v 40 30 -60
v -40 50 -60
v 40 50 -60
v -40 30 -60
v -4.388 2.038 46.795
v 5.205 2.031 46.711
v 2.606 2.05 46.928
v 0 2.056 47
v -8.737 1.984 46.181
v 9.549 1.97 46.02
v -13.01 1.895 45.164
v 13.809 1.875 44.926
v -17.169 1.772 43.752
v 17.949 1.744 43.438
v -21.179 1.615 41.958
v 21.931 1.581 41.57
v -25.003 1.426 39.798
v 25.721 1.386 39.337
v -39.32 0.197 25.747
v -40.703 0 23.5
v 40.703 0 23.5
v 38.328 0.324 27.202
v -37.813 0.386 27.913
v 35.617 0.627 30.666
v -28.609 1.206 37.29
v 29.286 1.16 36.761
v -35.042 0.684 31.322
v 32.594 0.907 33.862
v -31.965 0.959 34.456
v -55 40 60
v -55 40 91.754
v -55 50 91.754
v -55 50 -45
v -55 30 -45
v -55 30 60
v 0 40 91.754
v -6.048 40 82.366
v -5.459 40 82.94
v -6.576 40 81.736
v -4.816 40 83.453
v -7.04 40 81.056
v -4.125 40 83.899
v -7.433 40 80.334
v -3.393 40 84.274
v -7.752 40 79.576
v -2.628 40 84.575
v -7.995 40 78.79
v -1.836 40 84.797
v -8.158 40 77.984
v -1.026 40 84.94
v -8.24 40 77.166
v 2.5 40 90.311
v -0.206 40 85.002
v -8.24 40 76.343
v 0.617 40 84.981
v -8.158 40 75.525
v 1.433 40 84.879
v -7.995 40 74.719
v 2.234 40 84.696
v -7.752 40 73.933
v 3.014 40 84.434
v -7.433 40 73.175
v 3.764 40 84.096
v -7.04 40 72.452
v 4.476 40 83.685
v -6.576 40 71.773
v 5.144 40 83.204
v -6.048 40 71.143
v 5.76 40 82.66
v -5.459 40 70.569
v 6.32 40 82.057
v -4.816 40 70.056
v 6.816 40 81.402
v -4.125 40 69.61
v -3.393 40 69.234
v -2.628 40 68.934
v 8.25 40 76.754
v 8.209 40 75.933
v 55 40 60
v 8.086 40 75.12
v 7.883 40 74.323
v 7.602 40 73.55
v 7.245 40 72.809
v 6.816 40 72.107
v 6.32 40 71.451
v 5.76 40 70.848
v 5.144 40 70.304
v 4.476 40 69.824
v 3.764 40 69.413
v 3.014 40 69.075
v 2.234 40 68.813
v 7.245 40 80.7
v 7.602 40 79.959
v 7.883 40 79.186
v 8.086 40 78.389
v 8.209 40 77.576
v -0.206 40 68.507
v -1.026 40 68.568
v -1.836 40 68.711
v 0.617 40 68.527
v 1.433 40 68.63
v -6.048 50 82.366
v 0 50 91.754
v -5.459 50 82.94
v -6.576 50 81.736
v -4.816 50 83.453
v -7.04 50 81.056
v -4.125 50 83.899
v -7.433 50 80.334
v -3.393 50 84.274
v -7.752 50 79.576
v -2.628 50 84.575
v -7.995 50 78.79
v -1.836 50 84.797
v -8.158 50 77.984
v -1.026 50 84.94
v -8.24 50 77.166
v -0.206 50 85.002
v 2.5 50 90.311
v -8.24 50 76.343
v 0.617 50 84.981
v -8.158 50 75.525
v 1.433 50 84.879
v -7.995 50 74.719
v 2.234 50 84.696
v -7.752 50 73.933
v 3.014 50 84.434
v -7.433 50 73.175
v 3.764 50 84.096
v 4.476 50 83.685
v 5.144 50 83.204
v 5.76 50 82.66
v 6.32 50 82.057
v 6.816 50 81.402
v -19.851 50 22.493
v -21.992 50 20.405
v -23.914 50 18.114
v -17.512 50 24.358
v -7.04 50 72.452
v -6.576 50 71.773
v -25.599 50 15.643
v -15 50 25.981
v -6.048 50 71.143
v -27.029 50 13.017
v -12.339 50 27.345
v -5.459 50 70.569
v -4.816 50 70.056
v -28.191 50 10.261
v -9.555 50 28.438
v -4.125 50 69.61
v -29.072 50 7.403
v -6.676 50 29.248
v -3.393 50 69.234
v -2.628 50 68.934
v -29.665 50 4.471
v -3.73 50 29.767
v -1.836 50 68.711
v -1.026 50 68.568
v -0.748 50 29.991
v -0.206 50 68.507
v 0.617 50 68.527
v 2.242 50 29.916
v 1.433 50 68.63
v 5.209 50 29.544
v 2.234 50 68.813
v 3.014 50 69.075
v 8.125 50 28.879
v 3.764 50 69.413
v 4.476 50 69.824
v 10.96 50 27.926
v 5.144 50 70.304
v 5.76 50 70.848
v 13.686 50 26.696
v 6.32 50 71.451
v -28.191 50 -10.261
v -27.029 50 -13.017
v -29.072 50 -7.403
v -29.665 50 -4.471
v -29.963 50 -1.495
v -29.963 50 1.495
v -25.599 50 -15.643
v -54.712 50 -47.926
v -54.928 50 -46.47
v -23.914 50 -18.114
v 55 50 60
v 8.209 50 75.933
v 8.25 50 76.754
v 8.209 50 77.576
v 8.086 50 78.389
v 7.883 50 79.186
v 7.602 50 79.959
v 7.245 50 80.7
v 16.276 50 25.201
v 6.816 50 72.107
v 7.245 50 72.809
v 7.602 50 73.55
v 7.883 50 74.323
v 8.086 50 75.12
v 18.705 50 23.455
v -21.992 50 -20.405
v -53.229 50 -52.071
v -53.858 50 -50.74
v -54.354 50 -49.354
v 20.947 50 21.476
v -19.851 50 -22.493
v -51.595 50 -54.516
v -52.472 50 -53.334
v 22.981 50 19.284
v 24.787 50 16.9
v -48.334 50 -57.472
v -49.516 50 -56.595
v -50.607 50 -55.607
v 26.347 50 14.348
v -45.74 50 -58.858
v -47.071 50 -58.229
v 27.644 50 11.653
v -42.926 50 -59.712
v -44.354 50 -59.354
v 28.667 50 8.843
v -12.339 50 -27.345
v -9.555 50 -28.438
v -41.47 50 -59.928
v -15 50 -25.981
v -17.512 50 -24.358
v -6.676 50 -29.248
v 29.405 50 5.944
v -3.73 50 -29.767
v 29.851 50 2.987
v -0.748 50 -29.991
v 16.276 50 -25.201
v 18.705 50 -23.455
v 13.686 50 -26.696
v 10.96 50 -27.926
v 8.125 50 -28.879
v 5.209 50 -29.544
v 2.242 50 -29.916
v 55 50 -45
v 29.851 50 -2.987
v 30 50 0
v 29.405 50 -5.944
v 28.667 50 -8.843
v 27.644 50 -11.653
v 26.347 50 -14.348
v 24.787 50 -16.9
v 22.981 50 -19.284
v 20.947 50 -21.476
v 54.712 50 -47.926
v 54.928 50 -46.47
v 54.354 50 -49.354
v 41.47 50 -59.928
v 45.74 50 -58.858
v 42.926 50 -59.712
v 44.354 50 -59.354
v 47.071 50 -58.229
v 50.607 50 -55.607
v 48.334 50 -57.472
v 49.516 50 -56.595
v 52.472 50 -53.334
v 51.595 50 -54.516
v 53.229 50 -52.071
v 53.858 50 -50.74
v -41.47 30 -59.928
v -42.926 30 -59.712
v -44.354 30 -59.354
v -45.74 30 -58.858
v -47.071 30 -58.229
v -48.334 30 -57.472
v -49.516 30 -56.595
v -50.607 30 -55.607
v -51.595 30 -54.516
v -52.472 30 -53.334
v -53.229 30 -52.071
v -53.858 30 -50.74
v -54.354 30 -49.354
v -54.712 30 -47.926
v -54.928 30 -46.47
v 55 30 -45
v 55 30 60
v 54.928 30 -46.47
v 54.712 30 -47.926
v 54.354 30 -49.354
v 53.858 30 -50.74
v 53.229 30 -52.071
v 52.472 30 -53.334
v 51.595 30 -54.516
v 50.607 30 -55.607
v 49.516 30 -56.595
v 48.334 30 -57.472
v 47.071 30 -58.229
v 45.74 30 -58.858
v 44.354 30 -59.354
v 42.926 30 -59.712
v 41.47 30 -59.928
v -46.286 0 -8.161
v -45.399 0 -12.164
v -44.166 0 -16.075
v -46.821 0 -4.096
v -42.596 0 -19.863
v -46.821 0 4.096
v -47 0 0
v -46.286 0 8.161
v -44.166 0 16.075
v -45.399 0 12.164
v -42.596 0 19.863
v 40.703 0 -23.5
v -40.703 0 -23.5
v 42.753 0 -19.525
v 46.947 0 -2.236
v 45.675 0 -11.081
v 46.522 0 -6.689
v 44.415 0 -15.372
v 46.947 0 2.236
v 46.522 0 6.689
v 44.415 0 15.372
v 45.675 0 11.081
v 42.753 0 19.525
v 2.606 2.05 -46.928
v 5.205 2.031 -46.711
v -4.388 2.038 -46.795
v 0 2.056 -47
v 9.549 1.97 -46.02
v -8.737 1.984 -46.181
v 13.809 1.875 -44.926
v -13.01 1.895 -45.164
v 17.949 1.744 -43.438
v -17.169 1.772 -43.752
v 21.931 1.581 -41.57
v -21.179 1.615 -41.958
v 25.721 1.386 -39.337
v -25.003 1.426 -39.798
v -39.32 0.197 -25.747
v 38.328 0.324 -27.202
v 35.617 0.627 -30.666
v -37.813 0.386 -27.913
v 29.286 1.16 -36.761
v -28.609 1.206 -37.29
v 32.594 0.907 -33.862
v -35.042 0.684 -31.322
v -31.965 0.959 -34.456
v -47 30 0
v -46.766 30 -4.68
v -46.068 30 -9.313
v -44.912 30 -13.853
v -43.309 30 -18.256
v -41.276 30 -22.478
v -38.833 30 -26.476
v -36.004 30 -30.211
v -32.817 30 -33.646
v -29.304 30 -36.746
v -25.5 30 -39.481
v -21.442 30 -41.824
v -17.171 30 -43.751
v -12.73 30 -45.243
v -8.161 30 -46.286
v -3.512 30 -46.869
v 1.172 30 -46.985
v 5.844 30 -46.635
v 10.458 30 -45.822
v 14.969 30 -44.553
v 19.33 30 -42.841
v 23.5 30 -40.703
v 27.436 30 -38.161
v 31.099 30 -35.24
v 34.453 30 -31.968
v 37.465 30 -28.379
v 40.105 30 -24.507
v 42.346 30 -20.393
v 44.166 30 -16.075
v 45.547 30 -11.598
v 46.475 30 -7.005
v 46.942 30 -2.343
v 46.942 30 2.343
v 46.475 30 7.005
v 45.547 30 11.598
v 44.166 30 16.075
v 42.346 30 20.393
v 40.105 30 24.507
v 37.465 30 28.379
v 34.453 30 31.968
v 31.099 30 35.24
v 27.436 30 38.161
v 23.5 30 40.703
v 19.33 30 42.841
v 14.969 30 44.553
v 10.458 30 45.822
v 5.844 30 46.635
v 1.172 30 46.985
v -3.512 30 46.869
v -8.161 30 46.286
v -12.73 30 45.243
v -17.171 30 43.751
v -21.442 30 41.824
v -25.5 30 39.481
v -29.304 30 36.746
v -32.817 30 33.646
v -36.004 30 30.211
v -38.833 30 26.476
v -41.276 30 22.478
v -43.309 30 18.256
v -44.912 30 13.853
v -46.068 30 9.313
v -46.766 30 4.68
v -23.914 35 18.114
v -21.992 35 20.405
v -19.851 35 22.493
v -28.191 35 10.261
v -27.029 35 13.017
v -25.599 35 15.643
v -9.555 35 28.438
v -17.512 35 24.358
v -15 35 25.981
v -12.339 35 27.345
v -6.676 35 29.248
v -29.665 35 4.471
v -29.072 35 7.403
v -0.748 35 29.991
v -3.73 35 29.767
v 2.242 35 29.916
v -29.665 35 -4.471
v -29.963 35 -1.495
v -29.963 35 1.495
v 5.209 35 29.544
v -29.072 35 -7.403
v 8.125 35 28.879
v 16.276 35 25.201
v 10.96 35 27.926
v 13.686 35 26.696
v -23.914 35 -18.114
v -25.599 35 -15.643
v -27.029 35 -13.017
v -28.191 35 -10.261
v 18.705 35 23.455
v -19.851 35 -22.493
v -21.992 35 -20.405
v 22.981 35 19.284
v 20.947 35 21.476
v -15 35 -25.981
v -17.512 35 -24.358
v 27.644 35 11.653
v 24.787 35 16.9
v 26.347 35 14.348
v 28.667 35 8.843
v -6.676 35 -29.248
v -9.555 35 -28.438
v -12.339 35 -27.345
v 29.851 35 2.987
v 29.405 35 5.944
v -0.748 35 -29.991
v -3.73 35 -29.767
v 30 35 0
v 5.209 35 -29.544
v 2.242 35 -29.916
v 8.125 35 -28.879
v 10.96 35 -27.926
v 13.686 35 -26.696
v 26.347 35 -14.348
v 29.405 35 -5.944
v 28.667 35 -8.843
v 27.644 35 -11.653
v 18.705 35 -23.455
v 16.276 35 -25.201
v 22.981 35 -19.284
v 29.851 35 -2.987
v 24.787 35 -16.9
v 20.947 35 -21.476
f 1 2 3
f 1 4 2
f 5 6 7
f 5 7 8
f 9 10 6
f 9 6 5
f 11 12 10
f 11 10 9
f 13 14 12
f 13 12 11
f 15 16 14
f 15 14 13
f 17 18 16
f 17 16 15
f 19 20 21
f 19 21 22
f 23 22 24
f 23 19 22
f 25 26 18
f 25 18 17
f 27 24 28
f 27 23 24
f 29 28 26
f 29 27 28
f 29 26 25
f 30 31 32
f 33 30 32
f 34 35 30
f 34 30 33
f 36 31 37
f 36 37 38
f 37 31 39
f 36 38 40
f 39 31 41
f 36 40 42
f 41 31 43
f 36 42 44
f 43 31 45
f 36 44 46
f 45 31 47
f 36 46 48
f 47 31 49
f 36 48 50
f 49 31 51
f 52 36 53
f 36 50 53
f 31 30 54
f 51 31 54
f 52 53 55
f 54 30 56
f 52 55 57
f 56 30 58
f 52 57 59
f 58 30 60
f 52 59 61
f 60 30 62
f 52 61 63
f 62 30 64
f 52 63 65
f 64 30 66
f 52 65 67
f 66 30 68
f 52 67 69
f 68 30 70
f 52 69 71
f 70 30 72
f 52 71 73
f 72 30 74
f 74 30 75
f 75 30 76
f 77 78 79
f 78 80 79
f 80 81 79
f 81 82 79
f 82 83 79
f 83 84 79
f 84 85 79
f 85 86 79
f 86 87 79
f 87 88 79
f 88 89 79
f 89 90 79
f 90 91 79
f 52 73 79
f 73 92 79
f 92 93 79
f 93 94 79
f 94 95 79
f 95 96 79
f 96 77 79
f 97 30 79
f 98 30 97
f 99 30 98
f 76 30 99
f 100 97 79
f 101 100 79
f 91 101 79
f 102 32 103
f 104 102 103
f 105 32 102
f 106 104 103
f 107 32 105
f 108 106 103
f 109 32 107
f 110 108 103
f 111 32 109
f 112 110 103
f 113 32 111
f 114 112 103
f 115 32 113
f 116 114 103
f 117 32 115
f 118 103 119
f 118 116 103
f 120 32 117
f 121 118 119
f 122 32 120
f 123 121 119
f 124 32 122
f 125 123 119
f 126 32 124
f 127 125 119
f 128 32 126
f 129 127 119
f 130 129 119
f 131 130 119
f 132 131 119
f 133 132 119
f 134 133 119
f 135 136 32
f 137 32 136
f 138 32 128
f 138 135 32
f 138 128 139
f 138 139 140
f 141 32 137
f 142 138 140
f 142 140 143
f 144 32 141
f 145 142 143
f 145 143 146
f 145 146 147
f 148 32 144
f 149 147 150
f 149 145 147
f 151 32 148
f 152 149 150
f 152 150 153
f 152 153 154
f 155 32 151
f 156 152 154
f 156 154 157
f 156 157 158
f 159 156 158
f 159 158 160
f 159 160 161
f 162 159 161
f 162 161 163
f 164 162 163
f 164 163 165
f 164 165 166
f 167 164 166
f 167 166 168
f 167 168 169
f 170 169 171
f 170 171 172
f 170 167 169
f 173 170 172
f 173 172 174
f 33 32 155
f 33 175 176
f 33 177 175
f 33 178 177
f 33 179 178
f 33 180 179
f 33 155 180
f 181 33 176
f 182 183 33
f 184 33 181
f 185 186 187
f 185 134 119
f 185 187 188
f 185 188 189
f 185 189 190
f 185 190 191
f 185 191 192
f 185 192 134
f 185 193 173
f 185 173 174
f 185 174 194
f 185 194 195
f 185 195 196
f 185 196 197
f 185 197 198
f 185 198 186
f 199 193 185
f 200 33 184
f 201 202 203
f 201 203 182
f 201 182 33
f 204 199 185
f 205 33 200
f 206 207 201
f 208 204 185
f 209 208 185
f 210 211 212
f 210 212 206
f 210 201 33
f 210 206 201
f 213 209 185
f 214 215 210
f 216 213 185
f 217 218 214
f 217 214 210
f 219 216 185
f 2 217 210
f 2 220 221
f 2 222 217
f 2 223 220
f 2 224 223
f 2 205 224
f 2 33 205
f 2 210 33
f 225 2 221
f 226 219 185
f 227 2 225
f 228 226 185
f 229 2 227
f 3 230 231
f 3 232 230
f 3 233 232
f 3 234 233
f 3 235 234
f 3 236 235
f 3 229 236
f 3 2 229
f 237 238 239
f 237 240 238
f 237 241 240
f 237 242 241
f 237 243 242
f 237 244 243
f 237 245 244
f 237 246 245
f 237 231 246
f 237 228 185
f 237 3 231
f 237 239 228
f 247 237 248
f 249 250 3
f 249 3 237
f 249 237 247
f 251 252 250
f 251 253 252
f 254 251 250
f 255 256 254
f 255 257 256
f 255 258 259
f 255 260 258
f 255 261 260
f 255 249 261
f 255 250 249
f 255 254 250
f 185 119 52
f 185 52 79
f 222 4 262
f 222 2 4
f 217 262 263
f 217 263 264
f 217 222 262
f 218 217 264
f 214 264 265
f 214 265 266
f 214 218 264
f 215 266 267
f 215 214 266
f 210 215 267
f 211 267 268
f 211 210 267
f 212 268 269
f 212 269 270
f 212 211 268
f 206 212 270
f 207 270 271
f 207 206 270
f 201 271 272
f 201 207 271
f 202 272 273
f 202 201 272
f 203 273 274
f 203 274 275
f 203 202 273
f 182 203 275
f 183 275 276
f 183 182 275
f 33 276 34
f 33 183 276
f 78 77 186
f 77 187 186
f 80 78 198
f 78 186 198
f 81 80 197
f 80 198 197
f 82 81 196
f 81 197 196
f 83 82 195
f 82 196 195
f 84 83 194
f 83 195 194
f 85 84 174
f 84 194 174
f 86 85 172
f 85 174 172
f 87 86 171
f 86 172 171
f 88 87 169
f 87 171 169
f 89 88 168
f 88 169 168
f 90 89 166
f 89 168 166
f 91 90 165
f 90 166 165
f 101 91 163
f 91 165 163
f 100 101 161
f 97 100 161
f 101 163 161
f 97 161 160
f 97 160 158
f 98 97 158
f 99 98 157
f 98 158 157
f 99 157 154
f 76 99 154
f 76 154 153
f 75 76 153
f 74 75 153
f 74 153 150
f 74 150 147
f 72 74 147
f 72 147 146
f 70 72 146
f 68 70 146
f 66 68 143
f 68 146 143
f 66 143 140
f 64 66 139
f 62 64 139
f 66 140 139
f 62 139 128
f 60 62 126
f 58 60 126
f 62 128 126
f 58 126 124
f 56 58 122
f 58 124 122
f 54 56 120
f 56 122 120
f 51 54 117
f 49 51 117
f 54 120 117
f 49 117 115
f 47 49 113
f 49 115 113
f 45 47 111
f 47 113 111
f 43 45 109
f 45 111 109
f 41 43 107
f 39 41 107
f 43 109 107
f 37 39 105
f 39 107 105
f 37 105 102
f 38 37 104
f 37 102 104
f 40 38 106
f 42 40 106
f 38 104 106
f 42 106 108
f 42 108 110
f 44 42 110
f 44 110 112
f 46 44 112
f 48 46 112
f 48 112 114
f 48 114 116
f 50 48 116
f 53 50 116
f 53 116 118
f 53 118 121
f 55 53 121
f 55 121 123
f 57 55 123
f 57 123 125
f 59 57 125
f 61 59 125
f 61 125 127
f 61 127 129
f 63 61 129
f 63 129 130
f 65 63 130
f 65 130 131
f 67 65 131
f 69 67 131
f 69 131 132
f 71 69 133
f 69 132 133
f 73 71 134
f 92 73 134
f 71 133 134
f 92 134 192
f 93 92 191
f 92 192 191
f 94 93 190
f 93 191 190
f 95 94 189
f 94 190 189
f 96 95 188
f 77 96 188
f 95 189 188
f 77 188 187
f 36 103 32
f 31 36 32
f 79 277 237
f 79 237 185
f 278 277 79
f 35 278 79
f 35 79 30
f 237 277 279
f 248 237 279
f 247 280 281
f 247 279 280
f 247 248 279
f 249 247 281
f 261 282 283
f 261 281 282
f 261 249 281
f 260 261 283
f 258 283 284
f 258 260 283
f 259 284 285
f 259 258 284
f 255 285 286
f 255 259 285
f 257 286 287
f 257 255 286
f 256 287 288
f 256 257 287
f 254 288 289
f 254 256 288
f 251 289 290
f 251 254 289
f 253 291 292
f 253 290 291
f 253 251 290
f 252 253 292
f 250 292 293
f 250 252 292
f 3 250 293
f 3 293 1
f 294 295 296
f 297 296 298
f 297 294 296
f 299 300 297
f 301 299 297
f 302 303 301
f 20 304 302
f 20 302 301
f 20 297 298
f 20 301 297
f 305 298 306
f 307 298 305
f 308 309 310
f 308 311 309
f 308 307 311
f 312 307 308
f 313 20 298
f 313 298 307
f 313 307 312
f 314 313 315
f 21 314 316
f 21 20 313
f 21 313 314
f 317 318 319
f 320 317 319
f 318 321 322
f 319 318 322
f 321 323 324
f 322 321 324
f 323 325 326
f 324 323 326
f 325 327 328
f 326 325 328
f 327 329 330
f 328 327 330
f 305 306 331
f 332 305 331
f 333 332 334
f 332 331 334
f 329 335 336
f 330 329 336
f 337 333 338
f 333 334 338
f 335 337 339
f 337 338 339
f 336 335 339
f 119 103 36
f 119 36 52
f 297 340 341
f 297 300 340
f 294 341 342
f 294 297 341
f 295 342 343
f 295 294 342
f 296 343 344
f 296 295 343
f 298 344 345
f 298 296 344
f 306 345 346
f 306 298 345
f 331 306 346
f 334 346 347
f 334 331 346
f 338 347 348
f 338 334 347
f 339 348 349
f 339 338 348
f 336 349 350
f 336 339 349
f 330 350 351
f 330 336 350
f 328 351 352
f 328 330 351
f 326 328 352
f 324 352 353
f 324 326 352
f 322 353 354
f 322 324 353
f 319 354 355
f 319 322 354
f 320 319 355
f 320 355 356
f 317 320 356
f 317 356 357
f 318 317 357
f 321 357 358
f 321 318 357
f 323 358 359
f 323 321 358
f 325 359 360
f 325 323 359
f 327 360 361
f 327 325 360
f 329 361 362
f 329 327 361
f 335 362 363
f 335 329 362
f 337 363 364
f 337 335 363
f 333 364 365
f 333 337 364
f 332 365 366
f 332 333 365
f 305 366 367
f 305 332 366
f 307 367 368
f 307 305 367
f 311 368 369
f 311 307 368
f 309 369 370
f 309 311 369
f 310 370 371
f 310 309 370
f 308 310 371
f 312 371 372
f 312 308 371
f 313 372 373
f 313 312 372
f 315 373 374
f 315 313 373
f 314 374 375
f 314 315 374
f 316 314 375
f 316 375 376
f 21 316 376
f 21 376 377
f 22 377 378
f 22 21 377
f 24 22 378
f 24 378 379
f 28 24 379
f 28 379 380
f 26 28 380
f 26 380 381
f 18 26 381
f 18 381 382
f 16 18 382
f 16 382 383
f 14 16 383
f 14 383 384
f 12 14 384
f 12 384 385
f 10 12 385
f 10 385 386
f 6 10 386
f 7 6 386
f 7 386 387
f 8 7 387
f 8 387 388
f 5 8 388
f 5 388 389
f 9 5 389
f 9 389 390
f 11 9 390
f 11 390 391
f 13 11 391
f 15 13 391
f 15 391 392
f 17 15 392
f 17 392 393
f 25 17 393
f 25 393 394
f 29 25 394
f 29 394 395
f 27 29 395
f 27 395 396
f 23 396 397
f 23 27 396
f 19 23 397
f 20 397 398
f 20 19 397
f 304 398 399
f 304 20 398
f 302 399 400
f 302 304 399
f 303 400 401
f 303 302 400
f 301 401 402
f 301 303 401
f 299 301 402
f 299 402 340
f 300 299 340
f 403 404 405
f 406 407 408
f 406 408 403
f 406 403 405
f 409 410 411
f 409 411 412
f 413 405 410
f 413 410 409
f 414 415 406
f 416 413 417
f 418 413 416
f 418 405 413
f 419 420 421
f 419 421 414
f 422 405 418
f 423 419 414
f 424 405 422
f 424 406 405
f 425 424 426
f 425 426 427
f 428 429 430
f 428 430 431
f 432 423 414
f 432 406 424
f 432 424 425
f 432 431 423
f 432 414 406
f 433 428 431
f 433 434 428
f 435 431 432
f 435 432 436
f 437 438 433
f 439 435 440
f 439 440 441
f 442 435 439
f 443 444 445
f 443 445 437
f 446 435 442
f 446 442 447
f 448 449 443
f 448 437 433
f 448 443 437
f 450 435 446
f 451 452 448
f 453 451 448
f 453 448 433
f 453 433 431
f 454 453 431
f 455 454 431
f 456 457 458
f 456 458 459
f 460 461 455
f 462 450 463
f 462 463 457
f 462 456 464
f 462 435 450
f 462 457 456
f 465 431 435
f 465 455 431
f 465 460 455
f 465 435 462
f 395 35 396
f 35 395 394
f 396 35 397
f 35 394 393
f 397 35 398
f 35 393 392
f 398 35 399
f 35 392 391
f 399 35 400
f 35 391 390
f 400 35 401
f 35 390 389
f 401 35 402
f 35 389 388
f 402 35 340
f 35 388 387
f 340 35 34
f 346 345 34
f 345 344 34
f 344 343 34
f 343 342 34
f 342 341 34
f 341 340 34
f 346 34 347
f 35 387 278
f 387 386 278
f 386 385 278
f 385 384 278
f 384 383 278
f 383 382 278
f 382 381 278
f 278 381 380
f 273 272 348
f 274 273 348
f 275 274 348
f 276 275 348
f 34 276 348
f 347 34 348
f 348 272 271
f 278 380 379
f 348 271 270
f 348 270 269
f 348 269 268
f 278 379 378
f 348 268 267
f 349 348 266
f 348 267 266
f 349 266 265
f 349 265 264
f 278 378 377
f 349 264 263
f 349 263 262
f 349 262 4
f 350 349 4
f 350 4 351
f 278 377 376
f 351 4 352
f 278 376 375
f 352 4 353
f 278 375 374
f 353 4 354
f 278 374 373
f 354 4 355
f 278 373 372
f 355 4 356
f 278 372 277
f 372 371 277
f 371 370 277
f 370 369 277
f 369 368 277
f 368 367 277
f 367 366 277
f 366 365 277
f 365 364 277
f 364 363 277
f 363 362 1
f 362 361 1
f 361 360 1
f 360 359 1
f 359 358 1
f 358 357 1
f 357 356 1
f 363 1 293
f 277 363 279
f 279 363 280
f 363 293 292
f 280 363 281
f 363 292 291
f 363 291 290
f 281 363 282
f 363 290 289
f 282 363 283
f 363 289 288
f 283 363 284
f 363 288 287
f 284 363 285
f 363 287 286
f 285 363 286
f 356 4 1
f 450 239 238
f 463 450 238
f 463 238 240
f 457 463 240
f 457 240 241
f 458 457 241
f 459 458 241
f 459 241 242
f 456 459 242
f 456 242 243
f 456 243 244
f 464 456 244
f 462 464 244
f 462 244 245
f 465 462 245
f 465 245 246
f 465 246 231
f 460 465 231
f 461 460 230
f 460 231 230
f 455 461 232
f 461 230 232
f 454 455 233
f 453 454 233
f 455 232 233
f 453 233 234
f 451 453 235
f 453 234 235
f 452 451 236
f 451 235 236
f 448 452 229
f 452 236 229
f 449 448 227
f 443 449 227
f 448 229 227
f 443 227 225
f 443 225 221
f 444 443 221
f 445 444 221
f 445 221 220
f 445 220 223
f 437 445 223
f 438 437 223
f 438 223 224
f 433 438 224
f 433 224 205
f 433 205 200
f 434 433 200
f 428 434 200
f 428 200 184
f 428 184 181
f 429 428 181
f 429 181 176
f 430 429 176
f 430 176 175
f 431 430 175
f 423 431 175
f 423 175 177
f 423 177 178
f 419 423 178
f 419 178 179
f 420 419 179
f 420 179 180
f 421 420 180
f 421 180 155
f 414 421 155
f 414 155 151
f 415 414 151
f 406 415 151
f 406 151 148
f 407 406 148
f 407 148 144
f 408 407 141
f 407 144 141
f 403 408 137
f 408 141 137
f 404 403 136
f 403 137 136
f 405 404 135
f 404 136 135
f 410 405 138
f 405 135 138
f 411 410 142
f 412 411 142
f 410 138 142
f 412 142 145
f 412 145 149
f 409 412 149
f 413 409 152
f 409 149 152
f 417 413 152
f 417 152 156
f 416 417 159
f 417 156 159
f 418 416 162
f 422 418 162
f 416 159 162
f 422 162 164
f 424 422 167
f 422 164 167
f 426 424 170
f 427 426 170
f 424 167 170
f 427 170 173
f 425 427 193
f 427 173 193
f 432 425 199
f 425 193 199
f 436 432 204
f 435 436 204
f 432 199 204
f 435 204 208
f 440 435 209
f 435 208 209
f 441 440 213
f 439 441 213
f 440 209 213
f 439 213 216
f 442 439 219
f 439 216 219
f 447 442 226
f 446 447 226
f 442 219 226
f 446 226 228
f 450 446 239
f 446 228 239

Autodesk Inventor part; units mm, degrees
ref_plane "YZ Plane" through (0, 0, 0) normal (1, 0, 0) x (0, 1, 0)
ref_plane "XZ Plane" through (0, 0, 0) normal (0, 1, 0) x (-1, 0, 0)
ref_plane "XY Plane" through (0, 0, 0) normal (0, 0, 1) x (1, 0, 0)
sketch "스케치1" plane through (0, 0, 0) normal (0, 1, 0) x (-1, 0, 0)
  circle A0 centre (0, 0) radius 47
  circle A1 centre (0, 0) radius 35
  line L0 (0, 0) -> (0, 145.5)
  circle A2 centre (0, 145.5) radius 48.5
  circle A3 centre (0, 145.5) radius 36.5
  dimension "d0" = 94
  dimension "d1" = 12
  dimension "d2" = 145.5
  dimension "d3" = 97
  dimension "d4" = 12
extrude "돌출1" add sketch "스케치1" along normal blind 30 contours A0
sketch "스케치2" plane through (0, 30, 0) normal (0, 1, 0) x (1, 0, 0)
  line L0 (-55, 60) -> (55, 60)
  line L1 (55, 60) -> (55, -60)
  line L2 (55, -60) -> (-55, -60)
  line L3 (-55, -60) -> (-55, 60)
  line L4 (-55, 60) -> (55, -60) construction
  line L5 (55, 60) -> (-55, -60) construction
  point P0 (0, 0)
  dimension "d7" = 110
  dimension "d8" = 120
extrude "돌출2" add sketch "스케치2" along normal blind 20
fillet "모깎기1" radius 15 2 edges at (-55, 40, -60) (55, 40, -60)
sketch "스케치5" plane through (0, 50, 0) normal (0, 1, 0) x (1, 0, 0)
  circle A0 centre (0, 0) radius 30
  circle A1 centre (0, 0) radius 38
  dimension "d22" = 60
  dimension "d23" = 8
extrude "돌출5" [suppressed]
sketch "스케치6" plane through (0, 50, 0) normal (0, 1, 0) x (1, 0, 0)
  circle A0 centre (0, 0) radius 30
extrude "돌출6" cut sketch "스케치6" against normal blind 15
sketch "스케치7" plane through (0, 50, 0) normal (0, 1, 0) x (1, 0, 0)
  line L0 (-55, 45) -> (-55, -60) projected
  line L1 (-55, -60) -> (0, -91.7543)
  line L2 (-55, -60) -> (8.5085, -60) construction
  line L3 (55, -60) -> (55, 45) projected
  line L4 (0, -91.7543) -> (55, -60)
  line L5 (0, -91.7543) -> (0, -76.7543)
  circle A0 centre (0, -76.7543) radius 8.25
  line L6 (-55, -60) -> (55, -60)
  point P0 (0, 0)
  dimension "d28" = 30
  dimension "d29" = 15
  dimension "d30" = 16.5
extrude "돌출7" add sketch "스케치7" against normal blind 10
fillet "모깎기2" radius 5 1 edges at (0, 45, 91.7543)
sketch "스케치8" plane through (0, 0, 0) normal (0, -1, 0) x (1, 0, 0)
  circle A0 centre (0, 0) radius 35
extrude "돌출8" add sketch "스케치8" against normal up to surface (30 mm away)
sketch "스케치9" plane through (0, 0, 0) normal (1, 0, 0) x (0, 1, 0)
  line L0 (0, -47) -> (0, 47) projected
  line L1 (0, 0) -> (0, 47)
  line L2 (0, 47) -> (0, 23.5)
  line L3 (0, 23.5) -> (2.056, 47)
  line L4 (0, 47) -> (30, 47) projected
  line L5 (0, 23.5) -> (23.5898, 23.5) construction
  line L6 (0, 0) -> (0, -47)
  line L7 (0, -23.5) -> (2.056, -47)
  line L8 (0, -47) -> (2.056, -47)
  dimension "d36" = 85
extrude "돌출9" cut sketch "스케치9" along normal mid plane 100
sketch "스케치10" plane through (0, 50, 0) normal (0, 1, 0) x (1, 0, 0)
  line L0 (-55, -60) -> (-2.5, -90.3109) projected
  line L1 (-55, -60) -> (-2.5, -90.3109)
  line L2 (-2.5, -90.3109) -> (0, -91.7543)
  line L3 (0, -91.7543) -> (-55, -91.7543)
  line L4 (-55, -91.7543) -> (-55, -60)
  line L5 (55, -60) -> (2.5, -90.3109) projected
  line L6 (0, -91.7543) -> (2.5, -90.3109)
  arc A0 (-2.5, -90.3109) -> (2.5, -90.3109) centre (0, -85.9808) ccw projected
  circle A1 centre (0, -85.9808) radius 5
  point P0 (0, 0)
  dimension "d41" = 31.7543
  dimension "d42" = 55
  dimension "d43" = 60.6218
extrude "돌출10" add sketch "스케치10" against normal up to surface (10 mm away) contours L0 L2 L3 L4 | A0 L6 L2
properties part number "bracket_2"
